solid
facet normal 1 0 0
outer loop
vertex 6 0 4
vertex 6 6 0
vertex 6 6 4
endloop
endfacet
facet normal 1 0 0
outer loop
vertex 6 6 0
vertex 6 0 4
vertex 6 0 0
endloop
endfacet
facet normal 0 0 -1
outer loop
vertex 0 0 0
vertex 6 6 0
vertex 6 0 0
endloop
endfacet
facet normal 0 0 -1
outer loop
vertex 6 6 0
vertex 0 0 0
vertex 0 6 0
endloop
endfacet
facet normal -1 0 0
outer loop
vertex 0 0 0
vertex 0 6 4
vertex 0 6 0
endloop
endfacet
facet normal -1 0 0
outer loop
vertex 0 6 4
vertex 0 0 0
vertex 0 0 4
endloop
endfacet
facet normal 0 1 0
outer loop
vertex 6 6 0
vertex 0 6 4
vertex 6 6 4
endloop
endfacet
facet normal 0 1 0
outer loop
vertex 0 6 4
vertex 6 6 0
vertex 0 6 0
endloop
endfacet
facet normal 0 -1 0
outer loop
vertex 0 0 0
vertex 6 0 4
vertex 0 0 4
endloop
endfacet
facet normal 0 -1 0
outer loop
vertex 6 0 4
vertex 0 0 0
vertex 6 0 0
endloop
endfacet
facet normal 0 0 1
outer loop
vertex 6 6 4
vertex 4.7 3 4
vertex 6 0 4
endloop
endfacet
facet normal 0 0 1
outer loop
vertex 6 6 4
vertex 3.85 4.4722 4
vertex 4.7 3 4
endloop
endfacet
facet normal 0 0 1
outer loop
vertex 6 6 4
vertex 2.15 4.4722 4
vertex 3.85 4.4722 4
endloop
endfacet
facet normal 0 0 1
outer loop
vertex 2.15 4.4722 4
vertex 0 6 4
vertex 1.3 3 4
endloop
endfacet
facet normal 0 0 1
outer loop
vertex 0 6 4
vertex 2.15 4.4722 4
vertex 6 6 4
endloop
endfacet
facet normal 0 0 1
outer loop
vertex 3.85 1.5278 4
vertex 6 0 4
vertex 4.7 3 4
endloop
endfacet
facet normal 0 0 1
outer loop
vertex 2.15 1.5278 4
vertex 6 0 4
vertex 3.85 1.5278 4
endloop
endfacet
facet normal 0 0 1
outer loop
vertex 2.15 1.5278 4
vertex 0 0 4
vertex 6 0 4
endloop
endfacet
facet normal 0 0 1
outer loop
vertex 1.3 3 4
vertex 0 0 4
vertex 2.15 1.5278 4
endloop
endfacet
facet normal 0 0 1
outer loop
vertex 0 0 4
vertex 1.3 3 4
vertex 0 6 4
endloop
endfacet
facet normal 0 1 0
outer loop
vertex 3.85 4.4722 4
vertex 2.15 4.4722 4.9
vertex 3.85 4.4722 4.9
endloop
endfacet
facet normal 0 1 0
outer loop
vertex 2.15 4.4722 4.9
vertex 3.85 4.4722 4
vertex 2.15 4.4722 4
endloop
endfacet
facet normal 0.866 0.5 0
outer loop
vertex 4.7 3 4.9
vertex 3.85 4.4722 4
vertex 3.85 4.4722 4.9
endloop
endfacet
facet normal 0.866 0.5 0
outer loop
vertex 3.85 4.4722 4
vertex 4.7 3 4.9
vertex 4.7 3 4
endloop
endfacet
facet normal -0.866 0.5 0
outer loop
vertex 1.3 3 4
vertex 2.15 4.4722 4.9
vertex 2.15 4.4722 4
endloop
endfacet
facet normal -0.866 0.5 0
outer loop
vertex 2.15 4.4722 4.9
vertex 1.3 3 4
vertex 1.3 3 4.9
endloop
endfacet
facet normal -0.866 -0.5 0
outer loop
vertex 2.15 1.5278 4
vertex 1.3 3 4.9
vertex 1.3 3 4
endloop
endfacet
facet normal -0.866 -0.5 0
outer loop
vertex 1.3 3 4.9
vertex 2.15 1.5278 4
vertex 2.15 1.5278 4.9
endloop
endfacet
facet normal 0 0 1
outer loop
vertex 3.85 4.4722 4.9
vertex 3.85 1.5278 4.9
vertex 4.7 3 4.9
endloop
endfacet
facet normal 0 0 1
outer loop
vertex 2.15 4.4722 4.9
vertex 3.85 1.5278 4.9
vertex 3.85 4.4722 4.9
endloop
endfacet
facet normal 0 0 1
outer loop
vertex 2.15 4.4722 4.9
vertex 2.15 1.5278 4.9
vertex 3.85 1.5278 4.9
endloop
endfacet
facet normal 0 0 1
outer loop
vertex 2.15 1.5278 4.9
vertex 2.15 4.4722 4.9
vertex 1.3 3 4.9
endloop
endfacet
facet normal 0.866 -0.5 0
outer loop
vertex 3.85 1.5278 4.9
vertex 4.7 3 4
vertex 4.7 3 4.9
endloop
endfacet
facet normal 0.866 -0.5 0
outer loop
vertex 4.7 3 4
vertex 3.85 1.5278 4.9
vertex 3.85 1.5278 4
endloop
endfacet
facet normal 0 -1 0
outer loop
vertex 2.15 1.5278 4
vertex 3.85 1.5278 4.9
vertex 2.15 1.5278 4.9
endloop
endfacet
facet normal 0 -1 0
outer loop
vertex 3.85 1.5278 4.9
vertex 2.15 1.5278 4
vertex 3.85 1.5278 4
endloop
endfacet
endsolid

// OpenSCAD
module simpleButton(center = false, $fn = $fn) {

    x_size = 6;
    y_size = 6;
    z_size = 4;

    button_diameter = 3.4;
    button_z_size = 0.9;

    module _simpleButton() {
        color("DimGray")
            cube([x_size, y_size, z_size - 1], center = false);

        color("LightGrey")
            translate([0,0, z_size - 1])
            cube([x_size, y_size, 1], center = false);

        color("DimGray")
            translate([x_size / 2, y_size / 2, z_size])
                cylinder(h = button_z_size, d = button_diameter, $fn = $fn);
    }

    if (center) {
        translate([-x_size / 2, -y_size / 2, 0])
            _simpleButton();
    } else {
        _simpleButton();
    }
}

simpleButton();
